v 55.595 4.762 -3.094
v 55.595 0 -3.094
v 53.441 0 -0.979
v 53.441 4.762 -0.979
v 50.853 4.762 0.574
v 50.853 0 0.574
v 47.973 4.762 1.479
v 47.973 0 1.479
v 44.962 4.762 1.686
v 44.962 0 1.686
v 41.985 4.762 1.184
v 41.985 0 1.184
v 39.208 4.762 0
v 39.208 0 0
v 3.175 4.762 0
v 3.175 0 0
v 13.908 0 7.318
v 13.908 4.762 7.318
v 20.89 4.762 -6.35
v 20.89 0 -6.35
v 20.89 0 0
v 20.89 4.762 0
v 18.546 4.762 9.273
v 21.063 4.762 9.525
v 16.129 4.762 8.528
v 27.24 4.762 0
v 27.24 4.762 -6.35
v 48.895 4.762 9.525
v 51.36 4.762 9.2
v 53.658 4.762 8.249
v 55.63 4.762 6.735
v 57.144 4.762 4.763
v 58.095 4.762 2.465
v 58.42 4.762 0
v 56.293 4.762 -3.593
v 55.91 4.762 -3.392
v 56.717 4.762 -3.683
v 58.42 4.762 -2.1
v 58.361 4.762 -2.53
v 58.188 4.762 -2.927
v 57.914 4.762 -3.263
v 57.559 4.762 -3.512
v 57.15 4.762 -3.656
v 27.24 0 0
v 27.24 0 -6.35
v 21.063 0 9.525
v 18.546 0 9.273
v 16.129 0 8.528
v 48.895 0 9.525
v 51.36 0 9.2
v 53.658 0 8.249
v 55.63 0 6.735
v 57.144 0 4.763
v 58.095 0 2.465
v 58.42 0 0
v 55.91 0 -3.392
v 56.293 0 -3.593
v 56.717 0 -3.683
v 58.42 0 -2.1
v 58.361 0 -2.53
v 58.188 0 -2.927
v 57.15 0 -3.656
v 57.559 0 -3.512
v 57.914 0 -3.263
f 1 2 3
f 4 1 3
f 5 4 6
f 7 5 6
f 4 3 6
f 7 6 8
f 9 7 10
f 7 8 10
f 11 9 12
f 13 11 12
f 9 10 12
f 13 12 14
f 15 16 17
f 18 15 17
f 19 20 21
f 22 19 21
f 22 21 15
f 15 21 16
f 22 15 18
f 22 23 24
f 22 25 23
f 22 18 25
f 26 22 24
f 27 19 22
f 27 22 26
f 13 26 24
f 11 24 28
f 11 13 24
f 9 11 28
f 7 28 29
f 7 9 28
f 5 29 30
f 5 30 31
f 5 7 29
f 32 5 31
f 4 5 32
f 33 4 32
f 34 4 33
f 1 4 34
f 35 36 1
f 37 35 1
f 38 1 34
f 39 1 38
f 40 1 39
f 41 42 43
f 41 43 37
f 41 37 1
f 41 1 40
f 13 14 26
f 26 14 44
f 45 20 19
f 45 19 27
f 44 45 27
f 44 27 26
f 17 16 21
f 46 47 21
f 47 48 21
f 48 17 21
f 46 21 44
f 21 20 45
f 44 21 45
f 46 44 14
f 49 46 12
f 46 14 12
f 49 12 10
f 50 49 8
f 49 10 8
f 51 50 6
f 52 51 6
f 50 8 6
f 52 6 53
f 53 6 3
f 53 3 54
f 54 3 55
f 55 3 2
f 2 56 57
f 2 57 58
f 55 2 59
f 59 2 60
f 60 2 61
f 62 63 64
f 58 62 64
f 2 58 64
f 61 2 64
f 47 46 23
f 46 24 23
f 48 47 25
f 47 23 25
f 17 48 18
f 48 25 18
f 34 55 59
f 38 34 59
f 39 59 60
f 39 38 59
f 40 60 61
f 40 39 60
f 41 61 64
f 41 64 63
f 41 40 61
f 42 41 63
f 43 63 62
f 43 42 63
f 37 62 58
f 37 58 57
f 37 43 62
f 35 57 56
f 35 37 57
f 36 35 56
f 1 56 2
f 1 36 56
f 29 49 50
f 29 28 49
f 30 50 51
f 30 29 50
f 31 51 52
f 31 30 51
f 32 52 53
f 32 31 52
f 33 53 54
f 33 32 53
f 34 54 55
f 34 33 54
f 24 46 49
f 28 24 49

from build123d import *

# Parameters (mm, degrees)
BOSS_EXTRUDE1_DEPTH = 4.7625
FILLET1_R           = 9.525
FILLET2_R           = 1.5875
FILLET4_R           = 12.7
SKETCH2_W           = 6.35
SKETCH2_H           = 6.35
BOSS_EXTRUDE2_DEPTH = 4.7625


with BuildPart() as part:
    # Sketch1 → Boss-Extrude1 (new body)
    with BuildSketch(Plane(origin=(0, 0, 0), x_dir=(1, 0, 0), z_dir=(0, 1, 0))):
        with BuildLine():
            ThreePointArc((58.42, 11.1252), (52.020983, 0.025067), (39.208499, 0))
            Line((39.208499, 0), (3.175, 0))
            Line((3.175, 0), (17.145, -9.525))
            Line((17.145, -9.525), (58.42, -9.525))
            Line((58.42, -9.525), (58.42, 11.1252))
        make_face()
    extrude(amount=BOSS_EXTRUDE1_DEPTH)

    # Fillet1
    fillet1_edges = [part.edges().sort_by_distance(p)[0] for p in [
        (58.42, 2.38125, 9.525),
    ]]
    fillet(fillet1_edges, radius=FILLET1_R)

    # Fillet2
    fillet2_edges = [part.edges().sort_by_distance(p)[0] for p in [
        (58.42, 2.38125, -11.1252),
    ]]
    fillet(fillet2_edges, radius=FILLET2_R)

    # Fillet4
    fillet4_edges = [part.edges().sort_by_distance(p)[0] for p in [
        (17.145, 2.38125, 9.525),
    ]]
    fillet(fillet4_edges, radius=FILLET4_R)

    # Sketch2 → Boss-Extrude2 (add)
    with BuildSketch(Plane.XZ):
        with Locations((24.0645, -3.175)):
            Rectangle(SKETCH2_W, SKETCH2_H)
    extrude(amount=-BOSS_EXTRUDE2_DEPTH)


solid = part.part
